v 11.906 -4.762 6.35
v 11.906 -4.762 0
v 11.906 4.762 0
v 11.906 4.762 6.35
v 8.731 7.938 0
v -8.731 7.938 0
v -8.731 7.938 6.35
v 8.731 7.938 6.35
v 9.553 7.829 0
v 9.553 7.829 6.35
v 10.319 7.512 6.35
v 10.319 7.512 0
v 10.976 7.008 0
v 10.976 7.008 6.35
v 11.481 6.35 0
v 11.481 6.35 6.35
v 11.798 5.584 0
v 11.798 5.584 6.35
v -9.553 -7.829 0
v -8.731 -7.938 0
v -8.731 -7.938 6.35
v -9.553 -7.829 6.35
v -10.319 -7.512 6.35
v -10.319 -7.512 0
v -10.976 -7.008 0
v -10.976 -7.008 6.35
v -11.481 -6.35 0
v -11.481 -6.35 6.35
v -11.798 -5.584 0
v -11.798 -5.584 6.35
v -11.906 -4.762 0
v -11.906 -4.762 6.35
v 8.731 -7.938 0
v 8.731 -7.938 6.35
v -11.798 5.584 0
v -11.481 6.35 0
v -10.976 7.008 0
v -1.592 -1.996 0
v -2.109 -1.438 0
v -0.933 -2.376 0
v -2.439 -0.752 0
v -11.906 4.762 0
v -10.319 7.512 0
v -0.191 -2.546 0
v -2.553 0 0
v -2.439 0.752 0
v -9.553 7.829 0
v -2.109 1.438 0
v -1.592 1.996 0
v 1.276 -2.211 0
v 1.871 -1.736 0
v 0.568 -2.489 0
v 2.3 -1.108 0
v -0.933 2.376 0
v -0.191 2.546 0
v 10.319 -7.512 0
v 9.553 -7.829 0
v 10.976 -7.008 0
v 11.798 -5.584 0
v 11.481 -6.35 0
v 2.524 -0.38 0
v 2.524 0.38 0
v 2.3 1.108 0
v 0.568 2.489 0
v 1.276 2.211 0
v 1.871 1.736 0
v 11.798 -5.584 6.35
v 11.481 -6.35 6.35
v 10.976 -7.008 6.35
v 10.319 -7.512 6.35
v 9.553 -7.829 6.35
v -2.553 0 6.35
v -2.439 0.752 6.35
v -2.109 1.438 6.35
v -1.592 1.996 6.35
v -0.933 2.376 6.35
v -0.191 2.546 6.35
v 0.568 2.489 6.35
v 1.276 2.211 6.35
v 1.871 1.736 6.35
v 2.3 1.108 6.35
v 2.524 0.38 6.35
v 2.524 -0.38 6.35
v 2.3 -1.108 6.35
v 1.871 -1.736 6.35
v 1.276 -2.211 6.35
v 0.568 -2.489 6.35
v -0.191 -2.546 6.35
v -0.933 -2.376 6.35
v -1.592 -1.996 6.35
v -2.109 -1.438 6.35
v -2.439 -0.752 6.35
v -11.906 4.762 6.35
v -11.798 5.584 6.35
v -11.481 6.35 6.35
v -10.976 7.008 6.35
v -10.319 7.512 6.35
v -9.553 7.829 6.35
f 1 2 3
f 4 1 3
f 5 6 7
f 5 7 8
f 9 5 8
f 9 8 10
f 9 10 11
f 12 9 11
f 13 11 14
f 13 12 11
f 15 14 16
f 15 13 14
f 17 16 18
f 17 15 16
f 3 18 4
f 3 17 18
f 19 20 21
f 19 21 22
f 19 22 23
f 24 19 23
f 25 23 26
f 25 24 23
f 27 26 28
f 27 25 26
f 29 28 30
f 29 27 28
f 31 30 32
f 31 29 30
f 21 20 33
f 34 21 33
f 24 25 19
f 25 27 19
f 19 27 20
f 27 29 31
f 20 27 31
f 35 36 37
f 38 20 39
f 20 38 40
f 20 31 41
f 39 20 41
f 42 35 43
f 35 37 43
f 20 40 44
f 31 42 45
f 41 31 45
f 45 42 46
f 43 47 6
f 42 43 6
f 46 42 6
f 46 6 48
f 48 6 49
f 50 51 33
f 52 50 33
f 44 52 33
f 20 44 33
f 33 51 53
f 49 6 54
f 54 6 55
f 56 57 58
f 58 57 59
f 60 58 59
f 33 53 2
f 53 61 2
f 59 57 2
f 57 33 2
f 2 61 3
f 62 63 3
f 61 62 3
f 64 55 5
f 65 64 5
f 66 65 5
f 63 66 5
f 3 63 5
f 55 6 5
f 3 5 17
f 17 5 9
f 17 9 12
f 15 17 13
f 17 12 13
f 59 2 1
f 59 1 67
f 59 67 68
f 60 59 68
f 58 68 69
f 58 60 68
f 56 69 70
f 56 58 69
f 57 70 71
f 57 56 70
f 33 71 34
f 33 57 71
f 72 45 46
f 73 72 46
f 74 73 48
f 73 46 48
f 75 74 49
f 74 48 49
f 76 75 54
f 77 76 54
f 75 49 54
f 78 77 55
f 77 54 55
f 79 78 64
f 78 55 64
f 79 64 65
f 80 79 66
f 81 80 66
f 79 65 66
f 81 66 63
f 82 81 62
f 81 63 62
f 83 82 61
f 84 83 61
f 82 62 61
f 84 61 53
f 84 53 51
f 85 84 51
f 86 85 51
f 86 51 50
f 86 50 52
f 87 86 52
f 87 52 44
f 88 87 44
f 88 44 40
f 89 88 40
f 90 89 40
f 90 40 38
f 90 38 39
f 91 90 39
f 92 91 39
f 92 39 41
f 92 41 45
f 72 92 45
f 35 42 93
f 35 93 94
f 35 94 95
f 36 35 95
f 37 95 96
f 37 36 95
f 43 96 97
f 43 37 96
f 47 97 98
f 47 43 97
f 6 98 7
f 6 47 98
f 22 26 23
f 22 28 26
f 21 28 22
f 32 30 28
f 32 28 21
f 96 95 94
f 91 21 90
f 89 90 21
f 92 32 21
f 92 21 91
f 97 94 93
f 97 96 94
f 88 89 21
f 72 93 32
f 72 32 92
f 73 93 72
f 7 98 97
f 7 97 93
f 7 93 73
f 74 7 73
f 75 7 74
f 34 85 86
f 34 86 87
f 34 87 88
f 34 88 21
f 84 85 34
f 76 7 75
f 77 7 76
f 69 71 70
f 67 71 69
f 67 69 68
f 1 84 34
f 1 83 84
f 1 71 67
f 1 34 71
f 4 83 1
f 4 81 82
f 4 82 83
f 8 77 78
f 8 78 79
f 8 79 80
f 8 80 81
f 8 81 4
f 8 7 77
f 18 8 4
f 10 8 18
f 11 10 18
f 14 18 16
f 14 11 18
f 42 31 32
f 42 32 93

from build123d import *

# Parameters (mm, degrees)
SKETCH1_W               = 23.8125
SKETCH1_H               = 15.875
BASE_FLANGE1_DEPTH      = 6.35
F_1_4_20_TAPPED_HOLE1_D = 5.1054
BREAK_CORNER1_DEPTH     = 6.35


# Read off the part's stored shape, not the designer's step: Break-Corner1
# Sheet-metal steps are written as plain solids
with BuildPart() as part:
    # Sketch1 → Base-Flange1 (new body)
    with BuildSketch(Plane.XY):
        Rectangle(SKETCH1_W, SKETCH1_H)
    extrude(amount=BASE_FLANGE1_DEPTH)

    # 1/4-20 Tapped Hole1 (through all)
    with Locations(Plane.XY.offset(6.35)):
        with Locations((0, 0)):
            Hole(F_1_4_20_TAPPED_HOLE1_D / 2)

    # Break-Corner1 outline → Break-Corner1 (cut)
    with BuildSketch(Plane.XY):
        with BuildLine():
            Line((-11.90625, -7.9375), (-8.73125, -7.9375))
            ThreePointArc((-8.73125, -7.9375), (-10.97631403, -7.00756403), (-11.90625, -4.7625))
            Line((-11.90625, -4.7625), (-11.90625, -7.9375))
        make_face()
        with BuildLine():
            ThreePointArc((11.90625, -4.7625), (10.97631403, -7.00756403), (8.73125, -7.9375))
            Line((8.73125, -7.9375), (11.90625, -7.9375))
            Line((11.90625, -7.9375), (11.90625, -4.7625))
        make_face()
        with BuildLine():
            Line((-11.90625, 7.9375), (-11.90625, 4.7625))
            ThreePointArc((-11.90625, 4.7625), (-10.97631403, 7.00756403), (-8.73125, 7.9375))
            Line((-8.73125, 7.9375), (-11.90625, 7.9375))
        make_face()
        with BuildLine():
            ThreePointArc((8.73125, 7.9375), (10.97631403, 7.00756403), (11.90625, 4.7625))
            Line((11.90625, 4.7625), (11.90625, 7.9375))
            Line((11.90625, 7.9375), (8.73125, 7.9375))
        make_face()
    extrude(amount=BREAK_CORNER1_DEPTH, mode=Mode.SUBTRACT)


solid = part.part
